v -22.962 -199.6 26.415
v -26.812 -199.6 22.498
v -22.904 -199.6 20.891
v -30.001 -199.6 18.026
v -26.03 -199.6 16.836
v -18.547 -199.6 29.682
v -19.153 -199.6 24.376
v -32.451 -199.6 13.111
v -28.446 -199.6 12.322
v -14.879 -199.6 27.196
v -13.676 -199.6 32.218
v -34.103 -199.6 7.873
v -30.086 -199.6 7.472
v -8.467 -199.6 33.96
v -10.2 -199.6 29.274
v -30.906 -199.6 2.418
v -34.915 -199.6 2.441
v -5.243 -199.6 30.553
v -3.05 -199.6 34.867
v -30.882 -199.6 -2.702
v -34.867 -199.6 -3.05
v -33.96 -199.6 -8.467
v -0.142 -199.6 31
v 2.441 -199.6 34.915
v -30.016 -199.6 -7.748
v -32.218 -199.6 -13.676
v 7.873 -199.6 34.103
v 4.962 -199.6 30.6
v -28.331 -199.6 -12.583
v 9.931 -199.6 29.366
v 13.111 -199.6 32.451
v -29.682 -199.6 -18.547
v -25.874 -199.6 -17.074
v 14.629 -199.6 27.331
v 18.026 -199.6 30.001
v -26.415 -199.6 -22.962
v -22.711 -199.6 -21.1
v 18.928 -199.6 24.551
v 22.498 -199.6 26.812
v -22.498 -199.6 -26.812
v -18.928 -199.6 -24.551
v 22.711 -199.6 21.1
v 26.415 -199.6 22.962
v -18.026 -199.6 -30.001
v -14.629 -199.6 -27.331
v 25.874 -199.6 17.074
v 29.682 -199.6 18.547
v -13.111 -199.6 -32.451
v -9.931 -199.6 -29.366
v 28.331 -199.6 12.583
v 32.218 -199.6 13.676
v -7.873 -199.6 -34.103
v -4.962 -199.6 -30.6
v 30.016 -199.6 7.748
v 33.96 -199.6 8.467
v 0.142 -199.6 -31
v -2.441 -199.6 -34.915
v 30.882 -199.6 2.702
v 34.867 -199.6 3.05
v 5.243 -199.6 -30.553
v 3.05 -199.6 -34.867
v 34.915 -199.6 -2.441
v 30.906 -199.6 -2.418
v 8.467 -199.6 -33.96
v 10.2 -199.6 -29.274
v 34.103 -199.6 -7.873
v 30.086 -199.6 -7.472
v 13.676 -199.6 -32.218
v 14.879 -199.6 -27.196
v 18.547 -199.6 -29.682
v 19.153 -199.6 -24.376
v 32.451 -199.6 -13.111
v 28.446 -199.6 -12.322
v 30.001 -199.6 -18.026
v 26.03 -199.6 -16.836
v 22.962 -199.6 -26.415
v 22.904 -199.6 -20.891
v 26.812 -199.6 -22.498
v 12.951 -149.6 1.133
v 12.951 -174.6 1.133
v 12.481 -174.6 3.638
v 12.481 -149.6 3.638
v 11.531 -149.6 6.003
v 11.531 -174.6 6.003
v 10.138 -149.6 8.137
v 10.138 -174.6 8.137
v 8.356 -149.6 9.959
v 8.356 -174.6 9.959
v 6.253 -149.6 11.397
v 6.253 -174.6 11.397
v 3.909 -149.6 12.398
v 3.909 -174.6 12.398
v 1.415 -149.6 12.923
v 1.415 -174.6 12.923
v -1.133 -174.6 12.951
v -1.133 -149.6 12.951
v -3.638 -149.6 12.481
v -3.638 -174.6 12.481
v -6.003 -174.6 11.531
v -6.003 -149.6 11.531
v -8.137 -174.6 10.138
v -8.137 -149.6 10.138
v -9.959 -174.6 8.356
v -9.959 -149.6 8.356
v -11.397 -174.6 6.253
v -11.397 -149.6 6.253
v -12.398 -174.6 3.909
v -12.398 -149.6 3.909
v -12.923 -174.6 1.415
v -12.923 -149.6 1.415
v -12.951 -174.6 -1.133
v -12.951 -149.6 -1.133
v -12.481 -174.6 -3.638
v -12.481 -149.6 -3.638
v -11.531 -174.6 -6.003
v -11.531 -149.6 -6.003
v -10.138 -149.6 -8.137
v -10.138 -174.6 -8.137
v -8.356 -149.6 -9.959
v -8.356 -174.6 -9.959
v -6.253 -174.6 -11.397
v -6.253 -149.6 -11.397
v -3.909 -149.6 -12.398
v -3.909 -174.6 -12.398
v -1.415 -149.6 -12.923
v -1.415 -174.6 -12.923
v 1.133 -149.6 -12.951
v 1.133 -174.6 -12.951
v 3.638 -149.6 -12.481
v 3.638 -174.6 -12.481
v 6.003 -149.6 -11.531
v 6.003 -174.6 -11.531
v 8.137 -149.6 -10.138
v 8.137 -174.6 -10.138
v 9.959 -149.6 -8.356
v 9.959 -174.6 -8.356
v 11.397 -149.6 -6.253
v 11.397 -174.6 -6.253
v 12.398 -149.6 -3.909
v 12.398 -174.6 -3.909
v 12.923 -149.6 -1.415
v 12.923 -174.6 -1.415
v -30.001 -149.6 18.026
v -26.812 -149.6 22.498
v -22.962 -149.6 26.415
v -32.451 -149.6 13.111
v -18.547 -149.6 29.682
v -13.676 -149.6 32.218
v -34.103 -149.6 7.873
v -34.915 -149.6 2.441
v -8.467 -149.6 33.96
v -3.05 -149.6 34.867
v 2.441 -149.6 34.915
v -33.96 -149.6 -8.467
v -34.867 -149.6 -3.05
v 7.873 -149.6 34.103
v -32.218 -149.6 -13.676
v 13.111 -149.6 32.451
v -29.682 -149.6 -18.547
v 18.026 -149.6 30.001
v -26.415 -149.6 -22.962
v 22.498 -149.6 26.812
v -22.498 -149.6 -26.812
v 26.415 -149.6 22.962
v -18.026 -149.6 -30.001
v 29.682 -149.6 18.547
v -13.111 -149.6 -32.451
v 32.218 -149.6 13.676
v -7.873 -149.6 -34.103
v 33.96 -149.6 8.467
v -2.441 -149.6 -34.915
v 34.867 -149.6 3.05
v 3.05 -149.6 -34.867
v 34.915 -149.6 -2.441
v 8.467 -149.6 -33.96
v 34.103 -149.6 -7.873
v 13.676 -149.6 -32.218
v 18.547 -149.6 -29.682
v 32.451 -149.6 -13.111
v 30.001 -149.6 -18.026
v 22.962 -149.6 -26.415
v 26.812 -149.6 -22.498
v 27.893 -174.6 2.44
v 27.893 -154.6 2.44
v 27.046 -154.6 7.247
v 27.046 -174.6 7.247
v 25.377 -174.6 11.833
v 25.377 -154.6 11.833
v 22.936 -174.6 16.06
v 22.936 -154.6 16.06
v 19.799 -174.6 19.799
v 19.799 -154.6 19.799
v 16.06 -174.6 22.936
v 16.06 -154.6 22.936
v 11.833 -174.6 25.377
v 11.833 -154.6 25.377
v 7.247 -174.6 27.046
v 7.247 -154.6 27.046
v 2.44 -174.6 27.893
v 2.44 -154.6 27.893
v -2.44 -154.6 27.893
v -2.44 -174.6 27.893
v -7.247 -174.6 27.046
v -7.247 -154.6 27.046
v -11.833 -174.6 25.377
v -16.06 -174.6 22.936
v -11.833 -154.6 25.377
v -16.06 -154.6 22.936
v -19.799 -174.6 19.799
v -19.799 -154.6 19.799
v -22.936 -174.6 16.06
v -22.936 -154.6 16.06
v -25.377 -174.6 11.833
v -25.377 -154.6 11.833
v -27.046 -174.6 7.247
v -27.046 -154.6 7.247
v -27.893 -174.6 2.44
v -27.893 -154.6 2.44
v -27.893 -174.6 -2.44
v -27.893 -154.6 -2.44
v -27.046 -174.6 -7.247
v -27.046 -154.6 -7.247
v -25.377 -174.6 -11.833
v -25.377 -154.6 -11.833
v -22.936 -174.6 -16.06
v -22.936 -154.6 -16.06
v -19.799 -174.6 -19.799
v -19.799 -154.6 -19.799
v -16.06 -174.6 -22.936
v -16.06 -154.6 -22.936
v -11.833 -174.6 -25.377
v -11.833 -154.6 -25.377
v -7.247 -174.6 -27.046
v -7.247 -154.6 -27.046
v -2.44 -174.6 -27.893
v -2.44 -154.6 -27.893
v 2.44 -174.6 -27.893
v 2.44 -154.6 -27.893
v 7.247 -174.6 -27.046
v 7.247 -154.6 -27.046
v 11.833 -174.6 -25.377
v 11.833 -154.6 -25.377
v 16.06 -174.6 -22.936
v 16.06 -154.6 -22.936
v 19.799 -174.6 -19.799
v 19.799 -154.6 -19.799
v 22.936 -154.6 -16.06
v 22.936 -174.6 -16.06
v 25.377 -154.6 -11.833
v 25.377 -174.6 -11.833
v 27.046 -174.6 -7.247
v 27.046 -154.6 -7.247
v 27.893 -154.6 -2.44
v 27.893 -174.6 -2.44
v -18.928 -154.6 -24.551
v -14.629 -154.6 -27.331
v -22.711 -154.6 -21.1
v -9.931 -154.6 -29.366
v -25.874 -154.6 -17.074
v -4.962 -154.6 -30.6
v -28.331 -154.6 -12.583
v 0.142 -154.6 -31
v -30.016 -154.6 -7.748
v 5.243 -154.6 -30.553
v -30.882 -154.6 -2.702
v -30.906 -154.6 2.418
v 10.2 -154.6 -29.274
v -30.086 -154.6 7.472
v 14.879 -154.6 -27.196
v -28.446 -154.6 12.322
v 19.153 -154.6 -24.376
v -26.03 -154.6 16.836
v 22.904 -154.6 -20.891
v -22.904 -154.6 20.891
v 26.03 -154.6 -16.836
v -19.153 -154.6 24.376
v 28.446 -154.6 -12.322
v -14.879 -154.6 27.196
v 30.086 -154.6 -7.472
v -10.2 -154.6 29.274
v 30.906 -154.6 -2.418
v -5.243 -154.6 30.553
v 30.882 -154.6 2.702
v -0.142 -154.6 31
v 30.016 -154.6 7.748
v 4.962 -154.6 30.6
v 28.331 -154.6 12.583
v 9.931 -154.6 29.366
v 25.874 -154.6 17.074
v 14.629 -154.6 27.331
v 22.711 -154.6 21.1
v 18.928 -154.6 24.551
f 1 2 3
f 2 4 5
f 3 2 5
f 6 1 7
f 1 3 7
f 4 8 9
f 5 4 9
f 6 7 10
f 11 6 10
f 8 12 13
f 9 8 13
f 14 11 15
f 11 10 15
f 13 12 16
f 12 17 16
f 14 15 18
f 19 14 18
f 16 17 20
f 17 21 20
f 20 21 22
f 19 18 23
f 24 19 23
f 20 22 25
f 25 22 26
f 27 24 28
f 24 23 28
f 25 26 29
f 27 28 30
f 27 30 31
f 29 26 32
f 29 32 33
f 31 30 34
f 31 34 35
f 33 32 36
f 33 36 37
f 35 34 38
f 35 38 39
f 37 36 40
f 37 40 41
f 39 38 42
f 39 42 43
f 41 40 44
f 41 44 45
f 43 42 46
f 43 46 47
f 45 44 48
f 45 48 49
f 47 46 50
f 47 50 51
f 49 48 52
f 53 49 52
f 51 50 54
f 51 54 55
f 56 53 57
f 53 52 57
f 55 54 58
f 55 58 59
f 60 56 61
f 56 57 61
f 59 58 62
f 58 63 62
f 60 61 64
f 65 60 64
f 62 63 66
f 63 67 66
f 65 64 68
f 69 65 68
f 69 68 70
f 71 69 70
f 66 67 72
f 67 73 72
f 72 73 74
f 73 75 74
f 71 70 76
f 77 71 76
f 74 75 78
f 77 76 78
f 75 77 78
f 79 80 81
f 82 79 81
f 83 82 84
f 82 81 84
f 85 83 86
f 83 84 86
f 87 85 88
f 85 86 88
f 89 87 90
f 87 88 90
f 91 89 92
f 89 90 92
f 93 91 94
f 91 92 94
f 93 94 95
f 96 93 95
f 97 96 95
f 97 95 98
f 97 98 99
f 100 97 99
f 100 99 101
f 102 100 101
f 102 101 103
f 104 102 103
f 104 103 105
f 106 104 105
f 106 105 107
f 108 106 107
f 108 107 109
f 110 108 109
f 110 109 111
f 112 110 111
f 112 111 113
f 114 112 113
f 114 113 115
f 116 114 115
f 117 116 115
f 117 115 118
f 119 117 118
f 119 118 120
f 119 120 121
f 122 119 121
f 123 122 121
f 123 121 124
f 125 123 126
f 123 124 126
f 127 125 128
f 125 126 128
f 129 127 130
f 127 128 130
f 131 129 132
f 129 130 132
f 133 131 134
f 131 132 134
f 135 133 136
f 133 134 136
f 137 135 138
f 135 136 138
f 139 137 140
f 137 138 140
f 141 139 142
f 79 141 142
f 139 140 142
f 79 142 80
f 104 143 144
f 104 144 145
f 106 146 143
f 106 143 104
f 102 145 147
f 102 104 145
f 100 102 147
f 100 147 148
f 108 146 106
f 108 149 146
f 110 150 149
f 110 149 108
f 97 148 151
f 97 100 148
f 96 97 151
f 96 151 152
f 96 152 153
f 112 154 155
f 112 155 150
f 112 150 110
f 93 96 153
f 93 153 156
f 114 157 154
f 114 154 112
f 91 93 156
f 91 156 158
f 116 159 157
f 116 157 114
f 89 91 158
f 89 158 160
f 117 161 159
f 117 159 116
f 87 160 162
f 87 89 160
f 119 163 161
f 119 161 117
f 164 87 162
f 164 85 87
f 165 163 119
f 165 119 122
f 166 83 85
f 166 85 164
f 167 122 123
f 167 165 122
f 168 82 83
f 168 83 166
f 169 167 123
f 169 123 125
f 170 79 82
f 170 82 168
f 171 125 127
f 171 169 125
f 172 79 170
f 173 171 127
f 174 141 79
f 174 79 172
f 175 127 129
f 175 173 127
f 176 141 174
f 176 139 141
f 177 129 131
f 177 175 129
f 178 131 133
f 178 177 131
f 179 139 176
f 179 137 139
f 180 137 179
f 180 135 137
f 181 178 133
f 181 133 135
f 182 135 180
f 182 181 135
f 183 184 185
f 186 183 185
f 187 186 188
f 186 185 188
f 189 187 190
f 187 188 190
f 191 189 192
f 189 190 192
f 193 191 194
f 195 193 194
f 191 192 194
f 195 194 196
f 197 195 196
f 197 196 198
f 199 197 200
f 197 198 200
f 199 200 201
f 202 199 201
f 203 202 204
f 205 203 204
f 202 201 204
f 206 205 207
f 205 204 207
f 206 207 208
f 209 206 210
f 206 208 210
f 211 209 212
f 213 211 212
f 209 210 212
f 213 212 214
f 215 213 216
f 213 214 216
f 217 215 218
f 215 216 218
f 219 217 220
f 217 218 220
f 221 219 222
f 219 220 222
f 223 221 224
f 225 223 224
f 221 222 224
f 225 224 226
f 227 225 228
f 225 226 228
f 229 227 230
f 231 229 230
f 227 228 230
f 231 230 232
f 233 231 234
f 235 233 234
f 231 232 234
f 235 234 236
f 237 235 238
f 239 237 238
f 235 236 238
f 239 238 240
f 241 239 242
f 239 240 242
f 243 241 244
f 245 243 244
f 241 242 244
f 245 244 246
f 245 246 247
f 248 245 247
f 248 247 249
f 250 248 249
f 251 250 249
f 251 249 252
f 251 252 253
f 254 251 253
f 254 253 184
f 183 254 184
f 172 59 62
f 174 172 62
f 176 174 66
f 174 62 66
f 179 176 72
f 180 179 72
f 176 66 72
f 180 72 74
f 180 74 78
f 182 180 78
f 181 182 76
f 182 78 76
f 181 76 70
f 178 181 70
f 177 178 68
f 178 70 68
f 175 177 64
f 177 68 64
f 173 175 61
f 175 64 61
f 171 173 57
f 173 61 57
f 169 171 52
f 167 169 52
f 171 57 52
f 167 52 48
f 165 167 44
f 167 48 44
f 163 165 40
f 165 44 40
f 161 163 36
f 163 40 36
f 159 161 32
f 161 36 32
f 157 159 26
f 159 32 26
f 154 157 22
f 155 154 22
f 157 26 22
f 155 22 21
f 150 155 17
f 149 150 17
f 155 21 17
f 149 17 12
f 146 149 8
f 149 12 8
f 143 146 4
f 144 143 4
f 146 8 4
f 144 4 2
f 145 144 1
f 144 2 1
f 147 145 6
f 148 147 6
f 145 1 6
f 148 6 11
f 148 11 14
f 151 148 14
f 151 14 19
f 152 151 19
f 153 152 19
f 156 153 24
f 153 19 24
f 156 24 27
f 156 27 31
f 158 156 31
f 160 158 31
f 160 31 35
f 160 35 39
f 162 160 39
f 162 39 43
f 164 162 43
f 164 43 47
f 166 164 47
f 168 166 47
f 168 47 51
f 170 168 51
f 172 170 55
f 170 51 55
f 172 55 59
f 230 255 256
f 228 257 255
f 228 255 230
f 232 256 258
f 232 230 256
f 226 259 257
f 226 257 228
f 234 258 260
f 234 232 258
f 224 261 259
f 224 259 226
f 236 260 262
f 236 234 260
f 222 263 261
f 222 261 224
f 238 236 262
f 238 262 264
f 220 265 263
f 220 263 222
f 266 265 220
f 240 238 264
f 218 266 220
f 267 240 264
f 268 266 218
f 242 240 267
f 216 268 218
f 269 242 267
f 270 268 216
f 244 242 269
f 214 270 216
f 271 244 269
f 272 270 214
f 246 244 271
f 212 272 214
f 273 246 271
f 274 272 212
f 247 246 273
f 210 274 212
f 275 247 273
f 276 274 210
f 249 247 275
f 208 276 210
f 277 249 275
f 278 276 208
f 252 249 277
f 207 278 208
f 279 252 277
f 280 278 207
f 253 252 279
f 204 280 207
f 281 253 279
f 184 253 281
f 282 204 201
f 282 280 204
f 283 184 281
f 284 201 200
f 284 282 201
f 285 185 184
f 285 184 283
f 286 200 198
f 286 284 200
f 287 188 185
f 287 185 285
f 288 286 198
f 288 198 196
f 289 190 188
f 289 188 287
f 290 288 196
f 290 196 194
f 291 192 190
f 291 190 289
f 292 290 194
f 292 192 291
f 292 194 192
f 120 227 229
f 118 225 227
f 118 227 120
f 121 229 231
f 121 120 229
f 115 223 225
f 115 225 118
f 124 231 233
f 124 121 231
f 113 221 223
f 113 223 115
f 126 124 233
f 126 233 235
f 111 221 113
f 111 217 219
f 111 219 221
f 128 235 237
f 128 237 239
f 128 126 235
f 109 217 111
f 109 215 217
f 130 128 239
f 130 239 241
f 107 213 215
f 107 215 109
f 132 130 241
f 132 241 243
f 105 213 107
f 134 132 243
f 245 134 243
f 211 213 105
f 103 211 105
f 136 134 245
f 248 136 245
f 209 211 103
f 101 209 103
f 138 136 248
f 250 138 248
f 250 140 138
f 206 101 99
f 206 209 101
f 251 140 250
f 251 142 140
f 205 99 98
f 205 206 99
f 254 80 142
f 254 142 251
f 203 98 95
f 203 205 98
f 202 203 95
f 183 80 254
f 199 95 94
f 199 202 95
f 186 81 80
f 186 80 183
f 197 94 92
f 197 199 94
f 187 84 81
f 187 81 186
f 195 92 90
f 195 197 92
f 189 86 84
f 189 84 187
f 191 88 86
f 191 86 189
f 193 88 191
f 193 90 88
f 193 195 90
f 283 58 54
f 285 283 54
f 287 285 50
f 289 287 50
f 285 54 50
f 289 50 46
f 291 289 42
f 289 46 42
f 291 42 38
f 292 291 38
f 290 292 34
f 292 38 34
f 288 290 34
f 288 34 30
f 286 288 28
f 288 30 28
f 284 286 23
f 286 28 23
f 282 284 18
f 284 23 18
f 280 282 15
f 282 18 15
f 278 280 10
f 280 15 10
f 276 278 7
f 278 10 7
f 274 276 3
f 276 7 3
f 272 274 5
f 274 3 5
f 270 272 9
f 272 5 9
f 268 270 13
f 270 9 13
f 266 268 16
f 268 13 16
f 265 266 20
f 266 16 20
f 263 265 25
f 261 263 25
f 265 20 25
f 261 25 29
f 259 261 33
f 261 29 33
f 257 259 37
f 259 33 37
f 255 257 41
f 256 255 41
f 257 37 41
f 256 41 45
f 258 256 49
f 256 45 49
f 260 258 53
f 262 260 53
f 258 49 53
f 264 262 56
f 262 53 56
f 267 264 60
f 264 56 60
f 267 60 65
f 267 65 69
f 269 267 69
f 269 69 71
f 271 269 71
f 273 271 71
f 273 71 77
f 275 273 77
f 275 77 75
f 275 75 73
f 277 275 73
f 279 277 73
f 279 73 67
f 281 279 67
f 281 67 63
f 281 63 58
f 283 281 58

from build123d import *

# Parameters (mm, degrees)
SKETCH018_R         = 35
PAD013_DEPTH        = 50
SKETCH019_R         = 31
POCKET002_DEPTH     = 45
SKETCH020_R         = 28
PAD014_DEPTH        = 20
SKETCH021_R         = 13
POCKET003_DEPTH     = 25.001
BODY010_ROLL_ANGLE  = -90
BODY010_PITCH_ANGLE = -5


with BuildPart() as part:
    # Sketch018 → Pad013 (new body)
    with BuildSketch(Plane.XY):
        Circle(SKETCH018_R)
    extrude(amount=PAD013_DEPTH)

    # Sketch019 (on Face2 of Pad013) → Pocket002 (cut)
    with BuildSketch(Plane(origin=(0, 0, 0), x_dir=(1, 0, 0), z_dir=(0, 0, -1))):
        Circle(SKETCH019_R)
    extrude(amount=-POCKET002_DEPTH, mode=Mode.SUBTRACT)

    # Sketch020 (on Face5 of Pocket002) → Pad014 (join)
    with BuildSketch(Plane(origin=(0, 0, 45), x_dir=(1, 0, 0), z_dir=(0, 0, -1))):
        Circle(SKETCH020_R)
    extrude(amount=PAD014_DEPTH)

    # Sketch021 (on Face7 of Pad014) → Pocket003 (cut, through all)
    with BuildSketch(Plane(origin=(0, 0, 25), x_dir=(1, 0, 0), z_dir=(0, 0, -1))):
        Circle(SKETCH021_R)
    extrude(amount=-POCKET003_DEPTH, mode=Mode.SUBTRACT)


with BuildPart() as part_1:
    # Body010 roll: moved
    add(part.part.rotate(Axis((0, 0, 0), (1, 0, 0)), BODY010_ROLL_ANGLE))


with BuildPart() as part_2:
    # Body010 pitch: moved
    add(part_1.part.rotate(Axis((0, 0, 0), (0, 1, 0)), BODY010_PITCH_ANGLE))


with BuildPart() as part_3:
    # Body010 placement: moved
    add(part_2.part.moved(Location((0, -199.6, 0))))


solid = part_3.part
